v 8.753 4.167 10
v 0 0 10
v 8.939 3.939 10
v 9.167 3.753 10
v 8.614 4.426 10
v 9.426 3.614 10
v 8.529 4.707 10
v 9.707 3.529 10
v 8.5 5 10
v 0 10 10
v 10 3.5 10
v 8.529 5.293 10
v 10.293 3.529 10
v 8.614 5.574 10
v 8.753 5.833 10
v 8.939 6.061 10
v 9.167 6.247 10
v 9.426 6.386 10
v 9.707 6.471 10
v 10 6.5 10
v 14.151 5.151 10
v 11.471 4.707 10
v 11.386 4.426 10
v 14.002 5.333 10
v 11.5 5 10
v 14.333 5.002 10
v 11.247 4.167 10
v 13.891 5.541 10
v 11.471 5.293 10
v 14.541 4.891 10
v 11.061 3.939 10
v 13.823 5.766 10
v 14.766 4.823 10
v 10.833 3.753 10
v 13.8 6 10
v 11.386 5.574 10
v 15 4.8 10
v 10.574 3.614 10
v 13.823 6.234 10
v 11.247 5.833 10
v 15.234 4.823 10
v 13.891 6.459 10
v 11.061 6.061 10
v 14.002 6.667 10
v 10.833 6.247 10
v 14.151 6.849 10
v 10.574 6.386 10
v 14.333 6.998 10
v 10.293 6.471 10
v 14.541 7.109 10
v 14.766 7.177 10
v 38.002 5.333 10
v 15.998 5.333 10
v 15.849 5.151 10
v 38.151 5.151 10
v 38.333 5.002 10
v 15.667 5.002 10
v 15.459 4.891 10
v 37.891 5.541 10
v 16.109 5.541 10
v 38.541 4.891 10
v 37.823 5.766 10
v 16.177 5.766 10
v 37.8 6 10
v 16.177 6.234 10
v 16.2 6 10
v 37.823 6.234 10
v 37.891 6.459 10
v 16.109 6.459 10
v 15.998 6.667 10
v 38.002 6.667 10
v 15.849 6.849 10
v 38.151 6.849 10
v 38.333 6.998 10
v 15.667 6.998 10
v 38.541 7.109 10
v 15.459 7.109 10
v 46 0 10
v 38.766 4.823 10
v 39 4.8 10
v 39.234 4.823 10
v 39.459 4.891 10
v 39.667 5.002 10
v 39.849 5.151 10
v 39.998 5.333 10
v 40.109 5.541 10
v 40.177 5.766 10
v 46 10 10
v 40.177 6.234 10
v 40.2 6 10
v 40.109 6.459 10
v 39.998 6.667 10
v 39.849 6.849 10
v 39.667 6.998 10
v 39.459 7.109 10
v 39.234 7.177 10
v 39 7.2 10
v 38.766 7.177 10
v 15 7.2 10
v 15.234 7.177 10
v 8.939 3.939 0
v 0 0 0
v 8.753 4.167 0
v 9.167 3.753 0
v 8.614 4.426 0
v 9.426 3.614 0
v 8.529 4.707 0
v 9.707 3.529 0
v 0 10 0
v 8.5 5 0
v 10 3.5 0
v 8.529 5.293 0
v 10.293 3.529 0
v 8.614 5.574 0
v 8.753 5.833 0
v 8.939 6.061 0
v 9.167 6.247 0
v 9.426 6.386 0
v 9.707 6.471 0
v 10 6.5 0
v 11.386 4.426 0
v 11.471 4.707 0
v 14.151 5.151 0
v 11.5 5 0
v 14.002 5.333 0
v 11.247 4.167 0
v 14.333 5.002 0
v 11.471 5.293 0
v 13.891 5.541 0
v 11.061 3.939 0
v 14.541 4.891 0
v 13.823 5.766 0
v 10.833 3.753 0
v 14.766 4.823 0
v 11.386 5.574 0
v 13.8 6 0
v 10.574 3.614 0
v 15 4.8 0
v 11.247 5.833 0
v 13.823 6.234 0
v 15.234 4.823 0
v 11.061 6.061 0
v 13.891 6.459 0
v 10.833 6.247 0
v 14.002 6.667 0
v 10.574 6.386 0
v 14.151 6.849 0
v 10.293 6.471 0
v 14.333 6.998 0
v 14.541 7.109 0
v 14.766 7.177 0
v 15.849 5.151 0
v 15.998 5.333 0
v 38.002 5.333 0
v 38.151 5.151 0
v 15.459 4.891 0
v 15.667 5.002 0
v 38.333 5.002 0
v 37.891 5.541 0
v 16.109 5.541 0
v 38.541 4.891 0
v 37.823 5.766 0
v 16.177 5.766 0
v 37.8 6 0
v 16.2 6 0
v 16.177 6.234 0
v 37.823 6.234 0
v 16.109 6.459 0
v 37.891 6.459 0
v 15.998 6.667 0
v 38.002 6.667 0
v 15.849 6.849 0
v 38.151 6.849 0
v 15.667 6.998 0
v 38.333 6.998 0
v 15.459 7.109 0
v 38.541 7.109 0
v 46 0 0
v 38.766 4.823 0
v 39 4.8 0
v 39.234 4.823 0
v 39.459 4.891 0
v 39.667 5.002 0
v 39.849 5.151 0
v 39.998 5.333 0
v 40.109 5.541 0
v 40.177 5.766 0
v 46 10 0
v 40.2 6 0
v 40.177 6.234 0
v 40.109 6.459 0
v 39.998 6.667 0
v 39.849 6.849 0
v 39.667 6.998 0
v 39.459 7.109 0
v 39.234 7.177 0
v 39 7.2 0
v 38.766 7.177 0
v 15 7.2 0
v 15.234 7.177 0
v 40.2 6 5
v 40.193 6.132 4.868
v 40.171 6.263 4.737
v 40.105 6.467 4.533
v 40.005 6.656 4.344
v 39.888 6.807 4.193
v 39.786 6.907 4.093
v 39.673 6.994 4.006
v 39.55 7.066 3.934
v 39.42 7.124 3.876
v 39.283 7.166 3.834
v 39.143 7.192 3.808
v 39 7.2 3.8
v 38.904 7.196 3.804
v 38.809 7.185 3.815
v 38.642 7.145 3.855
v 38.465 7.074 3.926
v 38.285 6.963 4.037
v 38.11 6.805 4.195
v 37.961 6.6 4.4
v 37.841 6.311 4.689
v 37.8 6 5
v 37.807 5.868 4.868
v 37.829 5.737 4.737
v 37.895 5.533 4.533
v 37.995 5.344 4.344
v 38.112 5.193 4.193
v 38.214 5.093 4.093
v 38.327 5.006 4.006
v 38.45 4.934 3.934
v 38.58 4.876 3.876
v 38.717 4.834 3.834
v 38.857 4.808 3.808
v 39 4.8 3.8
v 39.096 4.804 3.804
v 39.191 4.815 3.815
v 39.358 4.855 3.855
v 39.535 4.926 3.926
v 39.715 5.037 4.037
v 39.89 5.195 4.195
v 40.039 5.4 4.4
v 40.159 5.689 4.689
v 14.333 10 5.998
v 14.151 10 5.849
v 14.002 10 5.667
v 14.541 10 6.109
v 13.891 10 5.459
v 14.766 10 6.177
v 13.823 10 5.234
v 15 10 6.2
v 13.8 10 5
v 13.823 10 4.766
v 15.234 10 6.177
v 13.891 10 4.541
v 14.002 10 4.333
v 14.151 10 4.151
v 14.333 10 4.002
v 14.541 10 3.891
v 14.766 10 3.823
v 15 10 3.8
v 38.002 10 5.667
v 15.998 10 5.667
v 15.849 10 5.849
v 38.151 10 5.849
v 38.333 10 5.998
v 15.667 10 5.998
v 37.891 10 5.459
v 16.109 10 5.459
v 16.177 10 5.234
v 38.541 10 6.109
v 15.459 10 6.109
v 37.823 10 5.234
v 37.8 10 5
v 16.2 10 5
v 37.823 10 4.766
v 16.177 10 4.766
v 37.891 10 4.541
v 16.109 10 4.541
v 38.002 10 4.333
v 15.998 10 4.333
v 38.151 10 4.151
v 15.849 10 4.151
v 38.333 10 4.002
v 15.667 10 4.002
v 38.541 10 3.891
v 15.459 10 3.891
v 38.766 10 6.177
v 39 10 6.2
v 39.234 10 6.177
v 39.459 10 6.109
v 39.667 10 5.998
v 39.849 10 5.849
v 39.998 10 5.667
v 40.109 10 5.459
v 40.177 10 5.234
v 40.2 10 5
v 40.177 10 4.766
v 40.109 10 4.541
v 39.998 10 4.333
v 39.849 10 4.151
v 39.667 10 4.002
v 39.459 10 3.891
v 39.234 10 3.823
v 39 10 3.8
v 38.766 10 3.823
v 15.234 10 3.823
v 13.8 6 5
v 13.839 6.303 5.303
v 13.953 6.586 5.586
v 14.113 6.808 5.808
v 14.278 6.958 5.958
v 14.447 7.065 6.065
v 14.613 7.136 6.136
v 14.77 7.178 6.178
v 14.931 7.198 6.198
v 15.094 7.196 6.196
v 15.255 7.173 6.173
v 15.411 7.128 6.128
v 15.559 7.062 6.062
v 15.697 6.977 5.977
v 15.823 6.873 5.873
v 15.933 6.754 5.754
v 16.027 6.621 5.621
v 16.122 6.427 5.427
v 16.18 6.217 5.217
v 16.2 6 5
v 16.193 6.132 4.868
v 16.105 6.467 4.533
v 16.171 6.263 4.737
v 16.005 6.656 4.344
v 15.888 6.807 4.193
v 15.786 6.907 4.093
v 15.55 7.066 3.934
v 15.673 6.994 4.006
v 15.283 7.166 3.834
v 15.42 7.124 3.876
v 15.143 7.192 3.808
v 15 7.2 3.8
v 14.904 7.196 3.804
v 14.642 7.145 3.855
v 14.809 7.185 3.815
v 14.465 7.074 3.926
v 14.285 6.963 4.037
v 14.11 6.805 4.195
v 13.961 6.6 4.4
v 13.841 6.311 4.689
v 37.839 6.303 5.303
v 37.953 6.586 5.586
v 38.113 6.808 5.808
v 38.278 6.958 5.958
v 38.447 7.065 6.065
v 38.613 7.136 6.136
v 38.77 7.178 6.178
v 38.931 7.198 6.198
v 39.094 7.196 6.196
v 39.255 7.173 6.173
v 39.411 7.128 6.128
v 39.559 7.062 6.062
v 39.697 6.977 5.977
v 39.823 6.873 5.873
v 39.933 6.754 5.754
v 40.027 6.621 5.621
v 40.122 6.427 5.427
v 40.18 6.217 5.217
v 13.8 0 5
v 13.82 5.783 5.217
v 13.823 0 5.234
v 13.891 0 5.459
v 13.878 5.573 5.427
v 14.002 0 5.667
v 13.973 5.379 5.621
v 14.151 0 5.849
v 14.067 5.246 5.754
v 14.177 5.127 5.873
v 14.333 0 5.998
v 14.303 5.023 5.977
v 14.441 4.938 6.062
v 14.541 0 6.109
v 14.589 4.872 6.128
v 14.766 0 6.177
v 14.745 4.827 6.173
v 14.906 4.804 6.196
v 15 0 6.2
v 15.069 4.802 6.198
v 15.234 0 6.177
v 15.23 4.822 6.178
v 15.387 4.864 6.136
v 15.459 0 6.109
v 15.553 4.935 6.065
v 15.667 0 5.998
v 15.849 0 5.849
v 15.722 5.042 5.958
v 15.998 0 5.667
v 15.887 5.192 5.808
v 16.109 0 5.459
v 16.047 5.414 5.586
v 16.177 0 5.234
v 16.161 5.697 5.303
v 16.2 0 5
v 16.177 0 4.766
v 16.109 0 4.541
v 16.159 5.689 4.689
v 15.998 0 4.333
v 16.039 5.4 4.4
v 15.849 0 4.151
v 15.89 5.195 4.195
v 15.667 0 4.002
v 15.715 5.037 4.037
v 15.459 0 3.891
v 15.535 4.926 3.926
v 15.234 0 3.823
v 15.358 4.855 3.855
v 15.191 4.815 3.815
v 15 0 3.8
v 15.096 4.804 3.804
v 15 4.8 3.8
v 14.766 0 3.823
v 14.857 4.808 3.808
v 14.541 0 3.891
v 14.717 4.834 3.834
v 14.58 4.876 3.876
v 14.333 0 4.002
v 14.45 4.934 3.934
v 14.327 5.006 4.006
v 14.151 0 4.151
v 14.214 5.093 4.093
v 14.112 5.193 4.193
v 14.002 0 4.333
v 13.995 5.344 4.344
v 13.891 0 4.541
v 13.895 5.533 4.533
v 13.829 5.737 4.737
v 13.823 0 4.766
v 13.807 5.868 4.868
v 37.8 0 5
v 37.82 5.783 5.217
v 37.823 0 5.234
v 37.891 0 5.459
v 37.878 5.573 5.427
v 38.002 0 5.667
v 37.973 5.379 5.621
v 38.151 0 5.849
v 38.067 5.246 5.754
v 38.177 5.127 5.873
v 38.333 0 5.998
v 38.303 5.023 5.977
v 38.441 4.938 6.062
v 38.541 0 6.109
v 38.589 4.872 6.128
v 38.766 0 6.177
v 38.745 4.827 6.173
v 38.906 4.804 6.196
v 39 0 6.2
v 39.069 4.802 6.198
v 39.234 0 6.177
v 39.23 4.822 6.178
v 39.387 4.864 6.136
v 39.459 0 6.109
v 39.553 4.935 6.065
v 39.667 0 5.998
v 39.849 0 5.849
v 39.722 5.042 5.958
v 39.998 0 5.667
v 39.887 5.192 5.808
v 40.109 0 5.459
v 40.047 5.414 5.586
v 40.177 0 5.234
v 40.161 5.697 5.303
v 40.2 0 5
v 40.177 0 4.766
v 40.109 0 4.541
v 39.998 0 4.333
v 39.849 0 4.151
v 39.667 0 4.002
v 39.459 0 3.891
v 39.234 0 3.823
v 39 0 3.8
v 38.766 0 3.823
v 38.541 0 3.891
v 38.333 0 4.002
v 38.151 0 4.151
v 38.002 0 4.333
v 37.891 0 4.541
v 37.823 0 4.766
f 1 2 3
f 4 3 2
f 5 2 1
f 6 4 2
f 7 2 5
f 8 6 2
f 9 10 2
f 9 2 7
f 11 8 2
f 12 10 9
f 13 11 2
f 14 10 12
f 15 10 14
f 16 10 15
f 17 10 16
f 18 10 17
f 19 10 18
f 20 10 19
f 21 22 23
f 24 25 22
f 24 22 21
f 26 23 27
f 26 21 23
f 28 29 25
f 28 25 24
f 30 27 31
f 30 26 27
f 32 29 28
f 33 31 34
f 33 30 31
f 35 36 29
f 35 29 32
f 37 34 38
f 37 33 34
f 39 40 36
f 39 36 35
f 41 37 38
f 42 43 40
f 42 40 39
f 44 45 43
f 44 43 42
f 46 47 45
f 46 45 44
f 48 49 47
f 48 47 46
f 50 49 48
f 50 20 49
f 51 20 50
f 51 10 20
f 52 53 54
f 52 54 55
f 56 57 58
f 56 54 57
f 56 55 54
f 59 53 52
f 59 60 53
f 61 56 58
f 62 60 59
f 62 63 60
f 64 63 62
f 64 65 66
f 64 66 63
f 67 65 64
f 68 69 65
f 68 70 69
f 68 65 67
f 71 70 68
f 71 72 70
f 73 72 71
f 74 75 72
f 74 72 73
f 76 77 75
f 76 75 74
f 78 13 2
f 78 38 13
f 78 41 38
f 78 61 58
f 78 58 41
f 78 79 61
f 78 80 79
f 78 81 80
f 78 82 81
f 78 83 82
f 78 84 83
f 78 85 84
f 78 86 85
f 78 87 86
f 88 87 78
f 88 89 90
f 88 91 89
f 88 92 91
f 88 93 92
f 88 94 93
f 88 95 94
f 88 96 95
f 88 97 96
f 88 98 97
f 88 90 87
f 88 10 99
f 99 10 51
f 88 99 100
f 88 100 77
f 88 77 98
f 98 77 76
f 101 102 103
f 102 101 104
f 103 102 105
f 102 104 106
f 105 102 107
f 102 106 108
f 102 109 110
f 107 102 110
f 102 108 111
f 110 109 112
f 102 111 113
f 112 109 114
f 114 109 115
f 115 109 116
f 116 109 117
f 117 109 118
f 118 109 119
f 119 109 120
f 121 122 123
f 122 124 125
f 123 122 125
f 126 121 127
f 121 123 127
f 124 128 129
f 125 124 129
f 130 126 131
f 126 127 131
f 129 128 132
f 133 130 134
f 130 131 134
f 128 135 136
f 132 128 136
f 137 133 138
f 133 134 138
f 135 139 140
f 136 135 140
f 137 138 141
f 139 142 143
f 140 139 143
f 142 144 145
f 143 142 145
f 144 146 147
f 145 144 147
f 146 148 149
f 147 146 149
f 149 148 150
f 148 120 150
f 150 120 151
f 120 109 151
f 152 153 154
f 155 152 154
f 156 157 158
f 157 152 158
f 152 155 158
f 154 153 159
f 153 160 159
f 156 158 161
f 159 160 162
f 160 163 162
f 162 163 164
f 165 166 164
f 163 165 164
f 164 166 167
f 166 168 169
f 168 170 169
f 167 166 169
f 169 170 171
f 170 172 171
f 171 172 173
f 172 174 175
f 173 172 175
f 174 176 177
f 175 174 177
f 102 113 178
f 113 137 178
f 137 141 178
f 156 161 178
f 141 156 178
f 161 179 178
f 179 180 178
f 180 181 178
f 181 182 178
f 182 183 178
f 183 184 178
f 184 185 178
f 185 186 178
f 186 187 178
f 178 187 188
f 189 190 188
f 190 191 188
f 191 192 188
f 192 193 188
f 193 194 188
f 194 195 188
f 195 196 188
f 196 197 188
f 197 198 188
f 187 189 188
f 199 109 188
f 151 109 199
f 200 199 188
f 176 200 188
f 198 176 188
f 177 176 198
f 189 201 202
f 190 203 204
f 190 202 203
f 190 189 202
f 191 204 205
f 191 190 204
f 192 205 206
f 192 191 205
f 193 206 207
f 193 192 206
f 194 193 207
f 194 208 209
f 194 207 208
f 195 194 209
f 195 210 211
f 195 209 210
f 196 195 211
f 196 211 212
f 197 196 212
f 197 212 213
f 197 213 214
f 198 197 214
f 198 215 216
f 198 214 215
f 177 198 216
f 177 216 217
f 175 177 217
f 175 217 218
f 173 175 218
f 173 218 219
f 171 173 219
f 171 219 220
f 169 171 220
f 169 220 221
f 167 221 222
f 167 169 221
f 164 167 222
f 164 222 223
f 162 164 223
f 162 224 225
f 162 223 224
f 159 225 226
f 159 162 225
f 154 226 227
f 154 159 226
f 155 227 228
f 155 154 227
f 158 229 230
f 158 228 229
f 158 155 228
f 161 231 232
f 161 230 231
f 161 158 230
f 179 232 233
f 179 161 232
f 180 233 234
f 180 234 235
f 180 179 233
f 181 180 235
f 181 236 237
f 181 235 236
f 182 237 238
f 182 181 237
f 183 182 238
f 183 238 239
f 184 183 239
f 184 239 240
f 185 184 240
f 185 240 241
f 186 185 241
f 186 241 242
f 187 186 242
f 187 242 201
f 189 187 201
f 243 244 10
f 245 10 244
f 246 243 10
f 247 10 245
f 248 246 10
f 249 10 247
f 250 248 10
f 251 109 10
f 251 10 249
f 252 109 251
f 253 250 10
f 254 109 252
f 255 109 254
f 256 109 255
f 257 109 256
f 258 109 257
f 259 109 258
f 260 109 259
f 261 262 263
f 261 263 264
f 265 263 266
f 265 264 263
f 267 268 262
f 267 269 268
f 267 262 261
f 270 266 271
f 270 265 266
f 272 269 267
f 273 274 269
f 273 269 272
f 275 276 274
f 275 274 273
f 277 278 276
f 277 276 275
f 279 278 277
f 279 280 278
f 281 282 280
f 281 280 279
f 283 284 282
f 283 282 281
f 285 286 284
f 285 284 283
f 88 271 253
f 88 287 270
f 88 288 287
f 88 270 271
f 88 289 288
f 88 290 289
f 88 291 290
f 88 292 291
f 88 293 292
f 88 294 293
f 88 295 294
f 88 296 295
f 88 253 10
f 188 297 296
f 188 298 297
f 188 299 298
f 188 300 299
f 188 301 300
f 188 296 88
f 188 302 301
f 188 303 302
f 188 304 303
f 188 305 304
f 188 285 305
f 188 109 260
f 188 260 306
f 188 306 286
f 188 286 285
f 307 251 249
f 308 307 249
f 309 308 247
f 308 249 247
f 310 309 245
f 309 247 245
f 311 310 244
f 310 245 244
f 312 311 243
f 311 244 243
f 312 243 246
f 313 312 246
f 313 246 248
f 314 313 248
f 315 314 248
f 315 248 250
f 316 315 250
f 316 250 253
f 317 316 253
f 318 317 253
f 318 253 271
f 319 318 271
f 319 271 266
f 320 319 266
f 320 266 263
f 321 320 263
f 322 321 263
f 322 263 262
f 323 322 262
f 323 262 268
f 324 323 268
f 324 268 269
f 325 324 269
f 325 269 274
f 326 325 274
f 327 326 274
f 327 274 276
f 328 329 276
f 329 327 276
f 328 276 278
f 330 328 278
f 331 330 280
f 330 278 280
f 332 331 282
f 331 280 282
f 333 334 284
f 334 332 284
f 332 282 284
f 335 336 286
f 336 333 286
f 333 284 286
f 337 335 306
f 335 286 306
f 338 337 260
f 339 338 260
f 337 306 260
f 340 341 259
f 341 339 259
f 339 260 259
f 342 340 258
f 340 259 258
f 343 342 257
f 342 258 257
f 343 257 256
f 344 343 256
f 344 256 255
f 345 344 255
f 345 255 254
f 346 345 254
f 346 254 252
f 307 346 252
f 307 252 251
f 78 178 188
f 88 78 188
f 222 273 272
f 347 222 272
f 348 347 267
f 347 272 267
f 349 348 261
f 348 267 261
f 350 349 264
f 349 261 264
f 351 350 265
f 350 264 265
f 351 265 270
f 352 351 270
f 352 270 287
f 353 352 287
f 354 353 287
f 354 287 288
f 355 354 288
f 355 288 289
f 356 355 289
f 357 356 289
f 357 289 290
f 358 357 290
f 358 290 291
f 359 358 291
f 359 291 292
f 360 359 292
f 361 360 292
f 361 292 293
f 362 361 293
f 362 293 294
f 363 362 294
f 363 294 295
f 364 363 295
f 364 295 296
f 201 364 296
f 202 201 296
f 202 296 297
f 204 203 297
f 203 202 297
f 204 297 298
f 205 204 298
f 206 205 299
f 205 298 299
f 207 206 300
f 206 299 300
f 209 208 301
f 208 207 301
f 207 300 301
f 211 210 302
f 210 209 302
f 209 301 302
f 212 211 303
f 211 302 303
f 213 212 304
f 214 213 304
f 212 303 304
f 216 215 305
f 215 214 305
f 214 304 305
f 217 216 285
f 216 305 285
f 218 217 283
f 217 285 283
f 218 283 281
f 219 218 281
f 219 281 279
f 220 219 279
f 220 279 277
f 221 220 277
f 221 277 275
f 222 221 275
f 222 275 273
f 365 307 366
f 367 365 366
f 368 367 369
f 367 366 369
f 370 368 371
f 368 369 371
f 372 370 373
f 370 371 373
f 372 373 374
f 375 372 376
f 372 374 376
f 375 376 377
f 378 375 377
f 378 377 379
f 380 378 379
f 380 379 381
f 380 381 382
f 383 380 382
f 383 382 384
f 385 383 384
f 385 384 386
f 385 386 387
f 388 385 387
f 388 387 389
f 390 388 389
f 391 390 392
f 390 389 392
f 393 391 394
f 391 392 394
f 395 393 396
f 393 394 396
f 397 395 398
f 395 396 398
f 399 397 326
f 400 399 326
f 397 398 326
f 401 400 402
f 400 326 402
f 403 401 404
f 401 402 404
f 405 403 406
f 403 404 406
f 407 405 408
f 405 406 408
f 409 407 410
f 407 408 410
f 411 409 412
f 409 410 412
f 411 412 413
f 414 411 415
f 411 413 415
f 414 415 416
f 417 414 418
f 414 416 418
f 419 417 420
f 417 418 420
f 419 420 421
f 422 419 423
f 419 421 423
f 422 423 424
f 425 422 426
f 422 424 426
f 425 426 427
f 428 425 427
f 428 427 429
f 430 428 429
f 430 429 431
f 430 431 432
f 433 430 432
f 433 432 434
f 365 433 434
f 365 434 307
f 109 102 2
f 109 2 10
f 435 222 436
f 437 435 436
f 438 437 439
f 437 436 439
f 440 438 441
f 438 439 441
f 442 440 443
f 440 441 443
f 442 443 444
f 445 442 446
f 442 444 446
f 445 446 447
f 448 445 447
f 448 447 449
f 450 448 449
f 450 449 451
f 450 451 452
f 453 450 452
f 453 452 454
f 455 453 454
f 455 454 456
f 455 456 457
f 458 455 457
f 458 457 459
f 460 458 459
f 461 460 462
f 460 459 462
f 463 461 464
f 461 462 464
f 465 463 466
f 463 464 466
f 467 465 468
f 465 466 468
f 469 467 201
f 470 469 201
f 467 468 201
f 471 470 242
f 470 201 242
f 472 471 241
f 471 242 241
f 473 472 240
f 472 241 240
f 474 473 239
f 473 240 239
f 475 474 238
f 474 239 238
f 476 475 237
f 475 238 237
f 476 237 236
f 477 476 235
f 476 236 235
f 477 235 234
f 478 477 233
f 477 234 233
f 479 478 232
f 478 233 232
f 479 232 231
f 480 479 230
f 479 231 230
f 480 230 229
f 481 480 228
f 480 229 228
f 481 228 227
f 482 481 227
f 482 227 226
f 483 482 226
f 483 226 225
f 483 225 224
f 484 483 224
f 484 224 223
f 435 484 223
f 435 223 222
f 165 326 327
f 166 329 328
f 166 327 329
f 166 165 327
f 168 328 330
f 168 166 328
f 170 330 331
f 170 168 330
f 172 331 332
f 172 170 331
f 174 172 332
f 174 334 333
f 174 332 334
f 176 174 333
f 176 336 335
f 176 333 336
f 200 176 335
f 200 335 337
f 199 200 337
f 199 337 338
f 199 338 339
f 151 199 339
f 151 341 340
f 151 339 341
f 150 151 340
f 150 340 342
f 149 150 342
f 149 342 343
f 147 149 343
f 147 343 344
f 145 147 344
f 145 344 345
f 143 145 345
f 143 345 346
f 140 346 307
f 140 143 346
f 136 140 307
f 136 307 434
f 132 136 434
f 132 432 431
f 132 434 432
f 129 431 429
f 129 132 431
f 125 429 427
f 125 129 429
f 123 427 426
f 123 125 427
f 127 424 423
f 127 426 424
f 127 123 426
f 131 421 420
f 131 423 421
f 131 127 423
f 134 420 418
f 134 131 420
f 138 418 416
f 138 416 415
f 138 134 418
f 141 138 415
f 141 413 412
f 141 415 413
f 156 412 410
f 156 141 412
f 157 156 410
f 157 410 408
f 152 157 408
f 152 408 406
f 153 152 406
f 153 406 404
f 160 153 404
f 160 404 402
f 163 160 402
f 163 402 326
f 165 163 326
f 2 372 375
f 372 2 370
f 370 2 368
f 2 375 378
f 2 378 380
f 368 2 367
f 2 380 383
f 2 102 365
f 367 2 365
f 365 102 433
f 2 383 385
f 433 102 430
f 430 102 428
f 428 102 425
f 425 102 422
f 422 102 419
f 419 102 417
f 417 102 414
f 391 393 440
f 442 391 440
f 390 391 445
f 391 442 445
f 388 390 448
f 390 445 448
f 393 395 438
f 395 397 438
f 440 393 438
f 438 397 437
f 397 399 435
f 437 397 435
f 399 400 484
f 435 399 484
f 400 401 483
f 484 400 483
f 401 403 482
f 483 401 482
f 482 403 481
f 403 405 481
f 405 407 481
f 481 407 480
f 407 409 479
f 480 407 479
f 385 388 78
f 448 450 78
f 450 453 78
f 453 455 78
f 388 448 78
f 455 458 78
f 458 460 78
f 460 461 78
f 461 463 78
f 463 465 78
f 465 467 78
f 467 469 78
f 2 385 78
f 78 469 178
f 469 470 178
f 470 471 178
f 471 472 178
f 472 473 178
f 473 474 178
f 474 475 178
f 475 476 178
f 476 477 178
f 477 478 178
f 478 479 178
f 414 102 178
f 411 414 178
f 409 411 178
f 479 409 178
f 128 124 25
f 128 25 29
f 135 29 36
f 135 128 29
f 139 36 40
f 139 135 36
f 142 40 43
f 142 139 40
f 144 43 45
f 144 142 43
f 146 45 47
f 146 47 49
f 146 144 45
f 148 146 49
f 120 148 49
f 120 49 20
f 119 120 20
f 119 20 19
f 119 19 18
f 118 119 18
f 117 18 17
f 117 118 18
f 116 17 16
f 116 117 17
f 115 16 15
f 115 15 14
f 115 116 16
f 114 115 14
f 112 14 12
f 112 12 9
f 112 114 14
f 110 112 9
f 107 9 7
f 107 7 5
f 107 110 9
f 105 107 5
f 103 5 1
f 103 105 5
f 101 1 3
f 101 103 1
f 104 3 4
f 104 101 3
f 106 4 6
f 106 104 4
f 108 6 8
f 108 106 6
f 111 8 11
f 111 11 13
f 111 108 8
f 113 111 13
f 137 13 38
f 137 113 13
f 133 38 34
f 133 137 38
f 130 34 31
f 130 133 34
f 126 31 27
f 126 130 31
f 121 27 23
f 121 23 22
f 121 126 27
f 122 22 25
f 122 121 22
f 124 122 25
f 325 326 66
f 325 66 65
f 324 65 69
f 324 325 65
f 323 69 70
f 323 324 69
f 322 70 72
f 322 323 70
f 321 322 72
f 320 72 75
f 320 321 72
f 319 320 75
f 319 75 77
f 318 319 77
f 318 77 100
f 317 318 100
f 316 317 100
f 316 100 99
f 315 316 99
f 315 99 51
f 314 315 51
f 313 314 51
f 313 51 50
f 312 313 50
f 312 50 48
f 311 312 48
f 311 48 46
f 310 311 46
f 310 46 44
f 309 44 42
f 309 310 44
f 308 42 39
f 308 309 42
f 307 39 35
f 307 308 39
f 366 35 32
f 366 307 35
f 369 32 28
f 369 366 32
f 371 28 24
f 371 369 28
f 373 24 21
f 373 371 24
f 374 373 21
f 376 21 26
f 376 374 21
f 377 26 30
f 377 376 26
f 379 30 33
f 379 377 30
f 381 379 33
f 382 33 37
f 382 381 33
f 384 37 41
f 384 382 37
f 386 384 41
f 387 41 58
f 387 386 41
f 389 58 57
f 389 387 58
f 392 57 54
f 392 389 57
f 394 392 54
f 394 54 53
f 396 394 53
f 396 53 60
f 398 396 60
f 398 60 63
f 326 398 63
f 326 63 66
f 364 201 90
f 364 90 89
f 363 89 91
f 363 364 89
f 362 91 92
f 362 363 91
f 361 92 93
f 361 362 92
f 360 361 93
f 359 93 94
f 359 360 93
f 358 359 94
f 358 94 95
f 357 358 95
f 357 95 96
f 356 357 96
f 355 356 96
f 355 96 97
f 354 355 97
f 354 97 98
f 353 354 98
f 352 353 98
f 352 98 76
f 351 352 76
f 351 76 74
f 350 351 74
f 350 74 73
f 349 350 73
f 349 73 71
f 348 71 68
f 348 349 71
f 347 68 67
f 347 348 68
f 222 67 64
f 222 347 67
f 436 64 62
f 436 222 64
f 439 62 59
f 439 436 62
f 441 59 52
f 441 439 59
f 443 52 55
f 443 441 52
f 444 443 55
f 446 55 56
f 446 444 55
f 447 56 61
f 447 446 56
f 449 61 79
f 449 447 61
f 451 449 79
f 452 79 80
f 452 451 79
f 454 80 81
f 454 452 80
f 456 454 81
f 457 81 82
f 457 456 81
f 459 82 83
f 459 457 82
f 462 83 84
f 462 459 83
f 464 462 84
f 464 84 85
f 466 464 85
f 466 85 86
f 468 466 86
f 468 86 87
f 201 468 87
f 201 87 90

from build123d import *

# Parameters (mm, degrees)
SKETCH_W     = 46
SKETCH_H     = 10
SKETCH_R     = 1.2
SKETCH_R_2   = 1.5
PAD_DEPTH    = 10
SKETCH001_R  = 1.2
POCKET_DEPTH = 10.001


with BuildPart() as part:
    # Sketch → Pad (new body)
    with BuildSketch(Plane.XY):
        with Locations((23, 5)):
            Rectangle(SKETCH_W, SKETCH_H)
        with Locations((15, 6)):
            Circle(SKETCH_R, mode=Mode.SUBTRACT)
        with Locations((39, 6)):
            Circle(SKETCH_R, mode=Mode.SUBTRACT)
        with Locations((10, 5)):
            Circle(SKETCH_R_2, mode=Mode.SUBTRACT)
    extrude(amount=PAD_DEPTH)

    # Sketch001 → Pocket (cut, through all)
    with BuildSketch(Plane(origin=(0, 10, 0), x_dir=(-1, 0, 0), z_dir=(0, 1, 0))):
        with Locations((-15, 5)):
            Circle(SKETCH001_R)
        with Locations((-39, 5)):
            Circle(SKETCH001_R)
    extrude(amount=-POCKET_DEPTH, mode=Mode.SUBTRACT)


solid = part.part
